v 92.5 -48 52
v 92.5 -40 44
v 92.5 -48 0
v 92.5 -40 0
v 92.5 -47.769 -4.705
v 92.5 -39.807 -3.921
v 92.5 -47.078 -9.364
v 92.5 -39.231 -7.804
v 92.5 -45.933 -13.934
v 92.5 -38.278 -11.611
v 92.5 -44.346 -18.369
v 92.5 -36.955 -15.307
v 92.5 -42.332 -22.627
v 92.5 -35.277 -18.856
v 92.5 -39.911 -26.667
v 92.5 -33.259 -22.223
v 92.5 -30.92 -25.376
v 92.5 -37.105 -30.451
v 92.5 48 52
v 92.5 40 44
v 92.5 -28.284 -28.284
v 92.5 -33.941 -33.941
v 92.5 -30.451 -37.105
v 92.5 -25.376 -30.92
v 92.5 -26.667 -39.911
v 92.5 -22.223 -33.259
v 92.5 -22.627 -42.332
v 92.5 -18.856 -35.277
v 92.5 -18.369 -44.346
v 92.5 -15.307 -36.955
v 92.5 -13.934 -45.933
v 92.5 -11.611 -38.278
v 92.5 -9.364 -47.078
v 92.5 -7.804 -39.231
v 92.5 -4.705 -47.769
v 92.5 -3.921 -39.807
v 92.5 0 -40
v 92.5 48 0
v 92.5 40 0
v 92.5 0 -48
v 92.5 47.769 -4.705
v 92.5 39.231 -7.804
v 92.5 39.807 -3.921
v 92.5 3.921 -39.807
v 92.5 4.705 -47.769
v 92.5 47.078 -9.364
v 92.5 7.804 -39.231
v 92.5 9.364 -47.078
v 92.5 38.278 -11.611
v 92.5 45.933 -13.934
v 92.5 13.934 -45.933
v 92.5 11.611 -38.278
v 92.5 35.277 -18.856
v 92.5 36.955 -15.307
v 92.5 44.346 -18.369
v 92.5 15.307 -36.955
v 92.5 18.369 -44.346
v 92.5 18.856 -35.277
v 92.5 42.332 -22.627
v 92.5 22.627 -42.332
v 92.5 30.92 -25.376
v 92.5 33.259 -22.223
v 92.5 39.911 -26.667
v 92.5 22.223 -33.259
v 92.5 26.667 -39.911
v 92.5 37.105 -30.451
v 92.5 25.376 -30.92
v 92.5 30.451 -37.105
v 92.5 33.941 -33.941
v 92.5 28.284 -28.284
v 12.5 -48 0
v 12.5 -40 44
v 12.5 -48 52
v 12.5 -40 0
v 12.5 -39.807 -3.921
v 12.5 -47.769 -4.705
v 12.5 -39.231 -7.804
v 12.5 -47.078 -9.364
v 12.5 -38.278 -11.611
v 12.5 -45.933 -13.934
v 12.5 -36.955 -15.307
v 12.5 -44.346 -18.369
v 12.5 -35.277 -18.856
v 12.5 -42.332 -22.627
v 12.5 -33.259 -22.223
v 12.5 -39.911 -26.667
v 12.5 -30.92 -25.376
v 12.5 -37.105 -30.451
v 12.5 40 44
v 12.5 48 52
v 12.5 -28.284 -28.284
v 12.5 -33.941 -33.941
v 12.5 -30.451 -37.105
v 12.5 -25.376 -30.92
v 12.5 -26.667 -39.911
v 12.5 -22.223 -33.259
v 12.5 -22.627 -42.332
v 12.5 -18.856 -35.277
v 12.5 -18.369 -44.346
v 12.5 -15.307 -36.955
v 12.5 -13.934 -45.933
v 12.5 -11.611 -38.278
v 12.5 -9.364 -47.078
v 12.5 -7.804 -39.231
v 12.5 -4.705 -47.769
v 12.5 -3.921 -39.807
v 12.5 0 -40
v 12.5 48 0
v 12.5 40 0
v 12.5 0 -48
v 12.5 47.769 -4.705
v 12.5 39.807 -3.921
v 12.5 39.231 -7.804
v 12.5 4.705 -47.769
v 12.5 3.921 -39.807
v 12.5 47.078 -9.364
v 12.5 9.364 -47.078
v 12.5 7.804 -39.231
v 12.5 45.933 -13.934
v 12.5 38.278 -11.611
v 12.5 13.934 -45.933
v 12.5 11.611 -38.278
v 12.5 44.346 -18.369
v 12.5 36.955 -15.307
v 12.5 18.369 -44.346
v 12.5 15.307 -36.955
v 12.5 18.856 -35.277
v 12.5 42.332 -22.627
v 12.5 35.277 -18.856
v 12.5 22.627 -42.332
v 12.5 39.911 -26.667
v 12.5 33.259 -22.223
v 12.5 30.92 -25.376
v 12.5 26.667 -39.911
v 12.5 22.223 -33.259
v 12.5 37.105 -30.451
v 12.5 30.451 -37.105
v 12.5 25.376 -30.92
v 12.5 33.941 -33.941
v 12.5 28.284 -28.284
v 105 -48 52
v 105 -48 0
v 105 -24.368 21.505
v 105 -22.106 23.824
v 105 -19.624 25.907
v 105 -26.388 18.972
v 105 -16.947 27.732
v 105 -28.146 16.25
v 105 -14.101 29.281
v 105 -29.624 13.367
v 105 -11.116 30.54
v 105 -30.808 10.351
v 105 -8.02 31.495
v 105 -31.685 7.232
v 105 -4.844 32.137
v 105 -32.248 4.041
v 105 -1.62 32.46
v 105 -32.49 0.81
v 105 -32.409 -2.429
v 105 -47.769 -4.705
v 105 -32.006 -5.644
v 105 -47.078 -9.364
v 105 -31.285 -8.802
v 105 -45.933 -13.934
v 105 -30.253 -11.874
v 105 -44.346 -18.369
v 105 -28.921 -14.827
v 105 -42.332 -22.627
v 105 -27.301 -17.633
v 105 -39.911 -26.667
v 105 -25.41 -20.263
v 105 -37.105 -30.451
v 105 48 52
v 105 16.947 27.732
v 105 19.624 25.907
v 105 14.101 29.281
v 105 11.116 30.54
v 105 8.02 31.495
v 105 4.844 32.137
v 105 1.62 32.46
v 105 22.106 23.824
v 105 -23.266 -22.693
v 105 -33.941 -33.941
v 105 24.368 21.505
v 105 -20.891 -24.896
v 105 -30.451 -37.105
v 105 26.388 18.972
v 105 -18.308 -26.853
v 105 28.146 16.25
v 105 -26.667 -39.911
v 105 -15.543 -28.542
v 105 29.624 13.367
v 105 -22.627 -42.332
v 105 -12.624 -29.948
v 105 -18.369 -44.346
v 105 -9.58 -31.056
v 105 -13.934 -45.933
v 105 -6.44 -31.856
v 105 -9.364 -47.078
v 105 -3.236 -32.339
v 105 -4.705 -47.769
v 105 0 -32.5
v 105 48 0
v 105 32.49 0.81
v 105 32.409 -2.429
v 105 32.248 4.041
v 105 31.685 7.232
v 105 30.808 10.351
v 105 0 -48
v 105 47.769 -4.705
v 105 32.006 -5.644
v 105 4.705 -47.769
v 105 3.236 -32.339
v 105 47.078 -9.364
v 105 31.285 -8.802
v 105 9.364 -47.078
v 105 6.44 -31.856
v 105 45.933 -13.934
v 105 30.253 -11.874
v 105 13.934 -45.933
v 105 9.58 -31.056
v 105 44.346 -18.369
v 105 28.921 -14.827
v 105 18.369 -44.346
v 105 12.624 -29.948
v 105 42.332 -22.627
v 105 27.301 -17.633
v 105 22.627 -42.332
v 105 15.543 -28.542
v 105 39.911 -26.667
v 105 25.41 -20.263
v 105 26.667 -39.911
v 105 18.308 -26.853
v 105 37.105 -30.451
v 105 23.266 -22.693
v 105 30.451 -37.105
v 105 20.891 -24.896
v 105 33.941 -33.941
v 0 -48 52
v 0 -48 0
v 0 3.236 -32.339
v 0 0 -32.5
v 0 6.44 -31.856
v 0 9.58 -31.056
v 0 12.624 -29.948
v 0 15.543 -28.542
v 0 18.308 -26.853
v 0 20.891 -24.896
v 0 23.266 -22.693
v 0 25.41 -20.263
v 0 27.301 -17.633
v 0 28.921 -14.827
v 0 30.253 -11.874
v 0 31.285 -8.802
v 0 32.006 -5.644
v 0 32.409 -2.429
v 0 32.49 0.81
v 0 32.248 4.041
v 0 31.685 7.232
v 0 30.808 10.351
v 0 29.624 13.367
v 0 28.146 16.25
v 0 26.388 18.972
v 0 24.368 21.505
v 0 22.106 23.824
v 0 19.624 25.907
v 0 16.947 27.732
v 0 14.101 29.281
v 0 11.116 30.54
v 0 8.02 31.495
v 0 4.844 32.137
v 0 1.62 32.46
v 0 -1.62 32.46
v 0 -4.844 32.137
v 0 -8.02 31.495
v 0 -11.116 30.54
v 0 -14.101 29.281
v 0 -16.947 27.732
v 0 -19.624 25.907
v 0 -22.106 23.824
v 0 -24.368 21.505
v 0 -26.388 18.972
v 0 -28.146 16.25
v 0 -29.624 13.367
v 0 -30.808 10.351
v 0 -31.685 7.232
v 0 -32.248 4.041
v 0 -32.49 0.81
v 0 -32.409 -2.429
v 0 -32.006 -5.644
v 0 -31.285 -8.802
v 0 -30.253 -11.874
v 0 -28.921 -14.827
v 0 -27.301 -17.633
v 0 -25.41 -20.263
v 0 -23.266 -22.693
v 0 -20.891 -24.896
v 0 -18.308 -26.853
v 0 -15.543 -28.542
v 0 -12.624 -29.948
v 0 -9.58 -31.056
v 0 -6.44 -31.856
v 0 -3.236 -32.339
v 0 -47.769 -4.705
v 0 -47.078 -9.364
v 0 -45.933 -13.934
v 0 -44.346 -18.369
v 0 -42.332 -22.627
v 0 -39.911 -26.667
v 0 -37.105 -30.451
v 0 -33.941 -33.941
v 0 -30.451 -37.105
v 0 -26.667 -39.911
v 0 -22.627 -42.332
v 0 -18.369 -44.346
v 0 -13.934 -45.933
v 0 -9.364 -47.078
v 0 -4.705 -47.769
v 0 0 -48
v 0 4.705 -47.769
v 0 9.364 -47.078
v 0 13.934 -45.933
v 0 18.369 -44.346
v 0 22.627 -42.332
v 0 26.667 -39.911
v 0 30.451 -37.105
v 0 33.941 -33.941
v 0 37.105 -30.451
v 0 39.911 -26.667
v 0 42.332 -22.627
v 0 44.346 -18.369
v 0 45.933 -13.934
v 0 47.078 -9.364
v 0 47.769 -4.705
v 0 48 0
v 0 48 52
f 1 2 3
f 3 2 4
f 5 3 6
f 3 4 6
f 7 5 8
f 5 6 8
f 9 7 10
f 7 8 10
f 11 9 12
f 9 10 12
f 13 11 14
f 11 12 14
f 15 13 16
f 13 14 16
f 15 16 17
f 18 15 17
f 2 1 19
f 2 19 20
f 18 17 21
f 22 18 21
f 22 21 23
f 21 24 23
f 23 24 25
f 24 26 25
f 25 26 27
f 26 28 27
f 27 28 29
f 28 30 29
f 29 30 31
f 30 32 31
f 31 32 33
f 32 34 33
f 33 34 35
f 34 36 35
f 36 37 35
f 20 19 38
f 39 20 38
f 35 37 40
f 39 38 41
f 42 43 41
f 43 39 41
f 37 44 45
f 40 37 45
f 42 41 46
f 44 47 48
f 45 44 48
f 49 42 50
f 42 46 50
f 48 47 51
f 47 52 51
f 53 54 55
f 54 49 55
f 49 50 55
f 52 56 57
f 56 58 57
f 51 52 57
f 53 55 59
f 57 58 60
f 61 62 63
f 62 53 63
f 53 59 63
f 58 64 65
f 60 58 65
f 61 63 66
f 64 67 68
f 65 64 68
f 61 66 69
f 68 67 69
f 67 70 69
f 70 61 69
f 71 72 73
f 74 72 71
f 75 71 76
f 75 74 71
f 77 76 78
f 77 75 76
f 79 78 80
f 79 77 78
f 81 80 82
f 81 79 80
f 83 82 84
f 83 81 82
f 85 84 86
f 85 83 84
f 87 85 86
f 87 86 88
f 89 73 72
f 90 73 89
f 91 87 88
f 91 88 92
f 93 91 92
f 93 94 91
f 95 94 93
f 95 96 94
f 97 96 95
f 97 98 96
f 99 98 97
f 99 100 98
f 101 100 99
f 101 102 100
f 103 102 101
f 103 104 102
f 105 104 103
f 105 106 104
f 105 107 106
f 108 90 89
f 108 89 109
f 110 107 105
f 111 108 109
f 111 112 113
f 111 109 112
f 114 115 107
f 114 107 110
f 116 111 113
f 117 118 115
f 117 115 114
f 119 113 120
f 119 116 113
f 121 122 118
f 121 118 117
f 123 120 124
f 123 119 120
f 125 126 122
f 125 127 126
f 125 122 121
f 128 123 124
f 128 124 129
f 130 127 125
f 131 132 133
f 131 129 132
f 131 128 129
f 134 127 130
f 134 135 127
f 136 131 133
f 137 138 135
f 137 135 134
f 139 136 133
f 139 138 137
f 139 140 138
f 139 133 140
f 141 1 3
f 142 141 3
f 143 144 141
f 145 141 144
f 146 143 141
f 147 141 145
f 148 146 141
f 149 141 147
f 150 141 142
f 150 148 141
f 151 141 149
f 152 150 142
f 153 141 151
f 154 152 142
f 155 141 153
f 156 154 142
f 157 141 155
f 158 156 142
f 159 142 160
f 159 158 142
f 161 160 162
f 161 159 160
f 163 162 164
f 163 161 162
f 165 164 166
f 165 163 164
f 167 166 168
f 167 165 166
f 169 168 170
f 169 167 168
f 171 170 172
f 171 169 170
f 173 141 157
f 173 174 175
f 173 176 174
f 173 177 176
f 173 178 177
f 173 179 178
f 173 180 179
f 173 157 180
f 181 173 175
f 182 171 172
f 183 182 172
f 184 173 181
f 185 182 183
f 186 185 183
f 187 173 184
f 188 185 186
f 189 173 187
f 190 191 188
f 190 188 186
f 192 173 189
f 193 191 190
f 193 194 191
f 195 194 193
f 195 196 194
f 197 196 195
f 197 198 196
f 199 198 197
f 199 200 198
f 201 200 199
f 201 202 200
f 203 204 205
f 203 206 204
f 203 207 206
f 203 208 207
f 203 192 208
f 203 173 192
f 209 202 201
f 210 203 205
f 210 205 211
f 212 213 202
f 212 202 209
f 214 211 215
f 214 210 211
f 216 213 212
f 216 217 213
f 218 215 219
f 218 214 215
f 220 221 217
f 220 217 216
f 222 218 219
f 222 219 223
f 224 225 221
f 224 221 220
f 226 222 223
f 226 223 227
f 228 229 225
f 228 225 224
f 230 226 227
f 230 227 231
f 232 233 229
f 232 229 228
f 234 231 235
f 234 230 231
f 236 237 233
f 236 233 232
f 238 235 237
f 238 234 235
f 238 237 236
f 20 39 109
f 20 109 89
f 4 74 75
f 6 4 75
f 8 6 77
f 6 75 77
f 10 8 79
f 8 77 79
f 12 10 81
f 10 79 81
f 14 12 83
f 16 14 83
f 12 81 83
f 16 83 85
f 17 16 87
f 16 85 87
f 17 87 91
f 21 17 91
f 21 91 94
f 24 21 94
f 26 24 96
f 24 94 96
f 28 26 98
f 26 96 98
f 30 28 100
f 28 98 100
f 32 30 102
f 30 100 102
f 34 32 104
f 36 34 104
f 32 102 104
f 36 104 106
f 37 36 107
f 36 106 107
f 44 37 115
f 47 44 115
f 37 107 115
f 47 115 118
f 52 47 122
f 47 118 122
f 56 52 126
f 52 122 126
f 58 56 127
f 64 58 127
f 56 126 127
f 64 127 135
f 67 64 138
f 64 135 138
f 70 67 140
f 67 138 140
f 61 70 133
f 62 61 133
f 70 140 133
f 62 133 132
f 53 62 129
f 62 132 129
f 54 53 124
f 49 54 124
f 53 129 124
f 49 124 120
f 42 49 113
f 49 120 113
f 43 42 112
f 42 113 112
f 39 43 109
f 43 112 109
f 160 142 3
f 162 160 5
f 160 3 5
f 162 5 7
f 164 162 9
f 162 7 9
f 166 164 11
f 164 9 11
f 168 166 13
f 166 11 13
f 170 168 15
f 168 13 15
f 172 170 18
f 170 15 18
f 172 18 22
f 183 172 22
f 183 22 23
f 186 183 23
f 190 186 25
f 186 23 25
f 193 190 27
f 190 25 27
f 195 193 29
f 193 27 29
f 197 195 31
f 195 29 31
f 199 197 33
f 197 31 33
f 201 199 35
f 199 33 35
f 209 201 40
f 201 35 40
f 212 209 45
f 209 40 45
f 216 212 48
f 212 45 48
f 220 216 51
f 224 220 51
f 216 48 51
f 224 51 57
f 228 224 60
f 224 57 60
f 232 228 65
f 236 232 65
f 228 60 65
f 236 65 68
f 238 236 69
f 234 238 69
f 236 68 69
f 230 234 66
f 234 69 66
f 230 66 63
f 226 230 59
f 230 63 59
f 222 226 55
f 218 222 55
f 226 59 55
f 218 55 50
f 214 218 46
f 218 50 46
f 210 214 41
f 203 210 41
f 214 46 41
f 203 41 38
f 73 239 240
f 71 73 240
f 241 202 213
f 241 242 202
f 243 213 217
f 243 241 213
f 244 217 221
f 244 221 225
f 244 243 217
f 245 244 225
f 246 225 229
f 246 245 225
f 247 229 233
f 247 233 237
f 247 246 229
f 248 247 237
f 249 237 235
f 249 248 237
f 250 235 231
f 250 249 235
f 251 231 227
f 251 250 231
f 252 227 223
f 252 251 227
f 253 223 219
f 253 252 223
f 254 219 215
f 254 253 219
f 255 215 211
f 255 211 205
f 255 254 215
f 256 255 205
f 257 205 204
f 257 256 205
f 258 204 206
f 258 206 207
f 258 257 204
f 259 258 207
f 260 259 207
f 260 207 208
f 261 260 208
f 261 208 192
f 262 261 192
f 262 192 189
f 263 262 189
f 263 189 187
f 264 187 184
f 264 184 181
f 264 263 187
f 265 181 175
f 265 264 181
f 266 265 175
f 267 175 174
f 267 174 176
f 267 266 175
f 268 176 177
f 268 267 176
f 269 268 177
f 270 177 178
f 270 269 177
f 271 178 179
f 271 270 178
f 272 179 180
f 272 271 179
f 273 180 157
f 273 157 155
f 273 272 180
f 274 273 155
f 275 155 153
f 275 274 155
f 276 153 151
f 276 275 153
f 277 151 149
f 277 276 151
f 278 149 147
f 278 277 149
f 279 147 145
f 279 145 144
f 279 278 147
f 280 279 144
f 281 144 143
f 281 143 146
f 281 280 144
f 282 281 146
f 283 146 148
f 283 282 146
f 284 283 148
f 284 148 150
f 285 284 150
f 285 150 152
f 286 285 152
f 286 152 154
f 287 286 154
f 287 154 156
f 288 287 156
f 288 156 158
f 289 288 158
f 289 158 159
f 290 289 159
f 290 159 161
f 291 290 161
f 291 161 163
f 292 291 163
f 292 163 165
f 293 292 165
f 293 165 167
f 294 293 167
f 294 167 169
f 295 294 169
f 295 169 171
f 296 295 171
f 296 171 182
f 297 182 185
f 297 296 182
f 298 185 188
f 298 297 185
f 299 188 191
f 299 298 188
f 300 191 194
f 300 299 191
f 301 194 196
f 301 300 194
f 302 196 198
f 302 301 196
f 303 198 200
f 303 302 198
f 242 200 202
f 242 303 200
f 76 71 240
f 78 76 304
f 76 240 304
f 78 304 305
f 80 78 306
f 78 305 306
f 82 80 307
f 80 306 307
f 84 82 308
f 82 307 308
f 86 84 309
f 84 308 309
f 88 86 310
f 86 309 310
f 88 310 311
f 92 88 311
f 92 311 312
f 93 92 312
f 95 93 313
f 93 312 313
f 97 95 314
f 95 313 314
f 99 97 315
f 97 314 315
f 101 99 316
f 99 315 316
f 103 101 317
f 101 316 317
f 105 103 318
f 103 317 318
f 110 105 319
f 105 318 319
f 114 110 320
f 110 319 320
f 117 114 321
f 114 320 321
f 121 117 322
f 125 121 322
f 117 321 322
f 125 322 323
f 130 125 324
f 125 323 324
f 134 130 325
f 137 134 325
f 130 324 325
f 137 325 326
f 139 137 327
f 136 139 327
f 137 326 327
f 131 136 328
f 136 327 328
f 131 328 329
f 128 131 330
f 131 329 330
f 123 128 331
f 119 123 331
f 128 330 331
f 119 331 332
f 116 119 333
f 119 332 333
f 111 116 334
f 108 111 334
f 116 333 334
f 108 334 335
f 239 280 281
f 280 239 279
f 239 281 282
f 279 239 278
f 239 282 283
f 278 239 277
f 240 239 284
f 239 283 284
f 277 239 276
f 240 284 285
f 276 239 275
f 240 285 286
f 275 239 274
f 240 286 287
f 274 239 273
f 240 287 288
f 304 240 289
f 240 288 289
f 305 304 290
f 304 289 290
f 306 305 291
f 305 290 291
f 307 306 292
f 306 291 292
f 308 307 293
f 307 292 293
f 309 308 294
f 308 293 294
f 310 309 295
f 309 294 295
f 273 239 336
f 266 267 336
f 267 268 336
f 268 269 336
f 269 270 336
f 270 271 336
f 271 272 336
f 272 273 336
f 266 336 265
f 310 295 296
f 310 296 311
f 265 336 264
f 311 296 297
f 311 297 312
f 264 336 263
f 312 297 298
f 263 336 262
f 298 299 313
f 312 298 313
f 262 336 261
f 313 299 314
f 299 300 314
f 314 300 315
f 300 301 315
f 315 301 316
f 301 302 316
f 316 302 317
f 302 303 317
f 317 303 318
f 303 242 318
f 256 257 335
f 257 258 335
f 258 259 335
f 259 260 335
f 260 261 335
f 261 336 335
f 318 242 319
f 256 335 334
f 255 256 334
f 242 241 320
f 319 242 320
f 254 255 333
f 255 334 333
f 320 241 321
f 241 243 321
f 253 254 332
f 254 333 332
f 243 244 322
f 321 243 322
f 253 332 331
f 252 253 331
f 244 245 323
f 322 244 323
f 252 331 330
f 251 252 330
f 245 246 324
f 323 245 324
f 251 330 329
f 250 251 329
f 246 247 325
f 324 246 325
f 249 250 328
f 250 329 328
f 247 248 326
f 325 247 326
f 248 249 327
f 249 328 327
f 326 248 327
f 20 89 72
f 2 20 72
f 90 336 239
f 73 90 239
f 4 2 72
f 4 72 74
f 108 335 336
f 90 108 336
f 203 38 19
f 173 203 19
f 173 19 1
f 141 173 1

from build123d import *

# Parameters (mm, degrees)
SKETCH1_R           = 32.5
BOSS_EXTRUDE1_DEPTH = 12.5
SKETCH2_R           = 32.5
BOSS_EXTRUDE2_DEPTH = 80
SKETCH3_R           = 32.5
BOSS_EXTRUDE3_DEPTH = 12.5


with BuildPart() as part:
    # Sketch1 → Boss-Extrude1 (new body)
    with BuildSketch(Plane(origin=(0, 0, 0), x_dir=(0, 0, -1), z_dir=(1, 0, 0))):
        with BuildLine():
            Line((-52, 48), (-52, -48))
            Line((-52, -48), (0, -48))
            ThreePointArc((0, -48), (48, 0), (0, 48))
            Line((0, 48), (-52, 48))
        make_face()
        Circle(SKETCH1_R, mode=Mode.SUBTRACT)
    extrude(amount=BOSS_EXTRUDE1_DEPTH)

    # Sketch2 → Boss-Extrude2 (add)
    with BuildSketch(Plane(origin=(12.5, 0, 0), x_dir=(0, 0, -1), z_dir=(1, 0, 0))):
        with BuildLine():
            Line((0, 40), (-44, 40))
            Line((-44, 40), (-44, -40))
            Line((-44, -40), (0, -40))
            ThreePointArc((0, -40), (40, 0), (0, 40))
        make_face()
        Circle(SKETCH2_R, mode=Mode.SUBTRACT)
    extrude(amount=BOSS_EXTRUDE2_DEPTH)

    # Sketch3 → Boss-Extrude3 (add)
    with BuildSketch(Plane(origin=(92.5, 0, 0), x_dir=(0, 0, -1), z_dir=(1, 0, 0))):
        with BuildLine():
            Line((0, 48), (-52, 48))
            Line((-52, 48), (-52, -48))
            Line((-52, -48), (0, -48))
            ThreePointArc((0, -48), (48, 0), (0, 48))
        make_face()
        Circle(SKETCH3_R, mode=Mode.SUBTRACT)
    extrude(amount=BOSS_EXTRUDE3_DEPTH)


solid = part.part
